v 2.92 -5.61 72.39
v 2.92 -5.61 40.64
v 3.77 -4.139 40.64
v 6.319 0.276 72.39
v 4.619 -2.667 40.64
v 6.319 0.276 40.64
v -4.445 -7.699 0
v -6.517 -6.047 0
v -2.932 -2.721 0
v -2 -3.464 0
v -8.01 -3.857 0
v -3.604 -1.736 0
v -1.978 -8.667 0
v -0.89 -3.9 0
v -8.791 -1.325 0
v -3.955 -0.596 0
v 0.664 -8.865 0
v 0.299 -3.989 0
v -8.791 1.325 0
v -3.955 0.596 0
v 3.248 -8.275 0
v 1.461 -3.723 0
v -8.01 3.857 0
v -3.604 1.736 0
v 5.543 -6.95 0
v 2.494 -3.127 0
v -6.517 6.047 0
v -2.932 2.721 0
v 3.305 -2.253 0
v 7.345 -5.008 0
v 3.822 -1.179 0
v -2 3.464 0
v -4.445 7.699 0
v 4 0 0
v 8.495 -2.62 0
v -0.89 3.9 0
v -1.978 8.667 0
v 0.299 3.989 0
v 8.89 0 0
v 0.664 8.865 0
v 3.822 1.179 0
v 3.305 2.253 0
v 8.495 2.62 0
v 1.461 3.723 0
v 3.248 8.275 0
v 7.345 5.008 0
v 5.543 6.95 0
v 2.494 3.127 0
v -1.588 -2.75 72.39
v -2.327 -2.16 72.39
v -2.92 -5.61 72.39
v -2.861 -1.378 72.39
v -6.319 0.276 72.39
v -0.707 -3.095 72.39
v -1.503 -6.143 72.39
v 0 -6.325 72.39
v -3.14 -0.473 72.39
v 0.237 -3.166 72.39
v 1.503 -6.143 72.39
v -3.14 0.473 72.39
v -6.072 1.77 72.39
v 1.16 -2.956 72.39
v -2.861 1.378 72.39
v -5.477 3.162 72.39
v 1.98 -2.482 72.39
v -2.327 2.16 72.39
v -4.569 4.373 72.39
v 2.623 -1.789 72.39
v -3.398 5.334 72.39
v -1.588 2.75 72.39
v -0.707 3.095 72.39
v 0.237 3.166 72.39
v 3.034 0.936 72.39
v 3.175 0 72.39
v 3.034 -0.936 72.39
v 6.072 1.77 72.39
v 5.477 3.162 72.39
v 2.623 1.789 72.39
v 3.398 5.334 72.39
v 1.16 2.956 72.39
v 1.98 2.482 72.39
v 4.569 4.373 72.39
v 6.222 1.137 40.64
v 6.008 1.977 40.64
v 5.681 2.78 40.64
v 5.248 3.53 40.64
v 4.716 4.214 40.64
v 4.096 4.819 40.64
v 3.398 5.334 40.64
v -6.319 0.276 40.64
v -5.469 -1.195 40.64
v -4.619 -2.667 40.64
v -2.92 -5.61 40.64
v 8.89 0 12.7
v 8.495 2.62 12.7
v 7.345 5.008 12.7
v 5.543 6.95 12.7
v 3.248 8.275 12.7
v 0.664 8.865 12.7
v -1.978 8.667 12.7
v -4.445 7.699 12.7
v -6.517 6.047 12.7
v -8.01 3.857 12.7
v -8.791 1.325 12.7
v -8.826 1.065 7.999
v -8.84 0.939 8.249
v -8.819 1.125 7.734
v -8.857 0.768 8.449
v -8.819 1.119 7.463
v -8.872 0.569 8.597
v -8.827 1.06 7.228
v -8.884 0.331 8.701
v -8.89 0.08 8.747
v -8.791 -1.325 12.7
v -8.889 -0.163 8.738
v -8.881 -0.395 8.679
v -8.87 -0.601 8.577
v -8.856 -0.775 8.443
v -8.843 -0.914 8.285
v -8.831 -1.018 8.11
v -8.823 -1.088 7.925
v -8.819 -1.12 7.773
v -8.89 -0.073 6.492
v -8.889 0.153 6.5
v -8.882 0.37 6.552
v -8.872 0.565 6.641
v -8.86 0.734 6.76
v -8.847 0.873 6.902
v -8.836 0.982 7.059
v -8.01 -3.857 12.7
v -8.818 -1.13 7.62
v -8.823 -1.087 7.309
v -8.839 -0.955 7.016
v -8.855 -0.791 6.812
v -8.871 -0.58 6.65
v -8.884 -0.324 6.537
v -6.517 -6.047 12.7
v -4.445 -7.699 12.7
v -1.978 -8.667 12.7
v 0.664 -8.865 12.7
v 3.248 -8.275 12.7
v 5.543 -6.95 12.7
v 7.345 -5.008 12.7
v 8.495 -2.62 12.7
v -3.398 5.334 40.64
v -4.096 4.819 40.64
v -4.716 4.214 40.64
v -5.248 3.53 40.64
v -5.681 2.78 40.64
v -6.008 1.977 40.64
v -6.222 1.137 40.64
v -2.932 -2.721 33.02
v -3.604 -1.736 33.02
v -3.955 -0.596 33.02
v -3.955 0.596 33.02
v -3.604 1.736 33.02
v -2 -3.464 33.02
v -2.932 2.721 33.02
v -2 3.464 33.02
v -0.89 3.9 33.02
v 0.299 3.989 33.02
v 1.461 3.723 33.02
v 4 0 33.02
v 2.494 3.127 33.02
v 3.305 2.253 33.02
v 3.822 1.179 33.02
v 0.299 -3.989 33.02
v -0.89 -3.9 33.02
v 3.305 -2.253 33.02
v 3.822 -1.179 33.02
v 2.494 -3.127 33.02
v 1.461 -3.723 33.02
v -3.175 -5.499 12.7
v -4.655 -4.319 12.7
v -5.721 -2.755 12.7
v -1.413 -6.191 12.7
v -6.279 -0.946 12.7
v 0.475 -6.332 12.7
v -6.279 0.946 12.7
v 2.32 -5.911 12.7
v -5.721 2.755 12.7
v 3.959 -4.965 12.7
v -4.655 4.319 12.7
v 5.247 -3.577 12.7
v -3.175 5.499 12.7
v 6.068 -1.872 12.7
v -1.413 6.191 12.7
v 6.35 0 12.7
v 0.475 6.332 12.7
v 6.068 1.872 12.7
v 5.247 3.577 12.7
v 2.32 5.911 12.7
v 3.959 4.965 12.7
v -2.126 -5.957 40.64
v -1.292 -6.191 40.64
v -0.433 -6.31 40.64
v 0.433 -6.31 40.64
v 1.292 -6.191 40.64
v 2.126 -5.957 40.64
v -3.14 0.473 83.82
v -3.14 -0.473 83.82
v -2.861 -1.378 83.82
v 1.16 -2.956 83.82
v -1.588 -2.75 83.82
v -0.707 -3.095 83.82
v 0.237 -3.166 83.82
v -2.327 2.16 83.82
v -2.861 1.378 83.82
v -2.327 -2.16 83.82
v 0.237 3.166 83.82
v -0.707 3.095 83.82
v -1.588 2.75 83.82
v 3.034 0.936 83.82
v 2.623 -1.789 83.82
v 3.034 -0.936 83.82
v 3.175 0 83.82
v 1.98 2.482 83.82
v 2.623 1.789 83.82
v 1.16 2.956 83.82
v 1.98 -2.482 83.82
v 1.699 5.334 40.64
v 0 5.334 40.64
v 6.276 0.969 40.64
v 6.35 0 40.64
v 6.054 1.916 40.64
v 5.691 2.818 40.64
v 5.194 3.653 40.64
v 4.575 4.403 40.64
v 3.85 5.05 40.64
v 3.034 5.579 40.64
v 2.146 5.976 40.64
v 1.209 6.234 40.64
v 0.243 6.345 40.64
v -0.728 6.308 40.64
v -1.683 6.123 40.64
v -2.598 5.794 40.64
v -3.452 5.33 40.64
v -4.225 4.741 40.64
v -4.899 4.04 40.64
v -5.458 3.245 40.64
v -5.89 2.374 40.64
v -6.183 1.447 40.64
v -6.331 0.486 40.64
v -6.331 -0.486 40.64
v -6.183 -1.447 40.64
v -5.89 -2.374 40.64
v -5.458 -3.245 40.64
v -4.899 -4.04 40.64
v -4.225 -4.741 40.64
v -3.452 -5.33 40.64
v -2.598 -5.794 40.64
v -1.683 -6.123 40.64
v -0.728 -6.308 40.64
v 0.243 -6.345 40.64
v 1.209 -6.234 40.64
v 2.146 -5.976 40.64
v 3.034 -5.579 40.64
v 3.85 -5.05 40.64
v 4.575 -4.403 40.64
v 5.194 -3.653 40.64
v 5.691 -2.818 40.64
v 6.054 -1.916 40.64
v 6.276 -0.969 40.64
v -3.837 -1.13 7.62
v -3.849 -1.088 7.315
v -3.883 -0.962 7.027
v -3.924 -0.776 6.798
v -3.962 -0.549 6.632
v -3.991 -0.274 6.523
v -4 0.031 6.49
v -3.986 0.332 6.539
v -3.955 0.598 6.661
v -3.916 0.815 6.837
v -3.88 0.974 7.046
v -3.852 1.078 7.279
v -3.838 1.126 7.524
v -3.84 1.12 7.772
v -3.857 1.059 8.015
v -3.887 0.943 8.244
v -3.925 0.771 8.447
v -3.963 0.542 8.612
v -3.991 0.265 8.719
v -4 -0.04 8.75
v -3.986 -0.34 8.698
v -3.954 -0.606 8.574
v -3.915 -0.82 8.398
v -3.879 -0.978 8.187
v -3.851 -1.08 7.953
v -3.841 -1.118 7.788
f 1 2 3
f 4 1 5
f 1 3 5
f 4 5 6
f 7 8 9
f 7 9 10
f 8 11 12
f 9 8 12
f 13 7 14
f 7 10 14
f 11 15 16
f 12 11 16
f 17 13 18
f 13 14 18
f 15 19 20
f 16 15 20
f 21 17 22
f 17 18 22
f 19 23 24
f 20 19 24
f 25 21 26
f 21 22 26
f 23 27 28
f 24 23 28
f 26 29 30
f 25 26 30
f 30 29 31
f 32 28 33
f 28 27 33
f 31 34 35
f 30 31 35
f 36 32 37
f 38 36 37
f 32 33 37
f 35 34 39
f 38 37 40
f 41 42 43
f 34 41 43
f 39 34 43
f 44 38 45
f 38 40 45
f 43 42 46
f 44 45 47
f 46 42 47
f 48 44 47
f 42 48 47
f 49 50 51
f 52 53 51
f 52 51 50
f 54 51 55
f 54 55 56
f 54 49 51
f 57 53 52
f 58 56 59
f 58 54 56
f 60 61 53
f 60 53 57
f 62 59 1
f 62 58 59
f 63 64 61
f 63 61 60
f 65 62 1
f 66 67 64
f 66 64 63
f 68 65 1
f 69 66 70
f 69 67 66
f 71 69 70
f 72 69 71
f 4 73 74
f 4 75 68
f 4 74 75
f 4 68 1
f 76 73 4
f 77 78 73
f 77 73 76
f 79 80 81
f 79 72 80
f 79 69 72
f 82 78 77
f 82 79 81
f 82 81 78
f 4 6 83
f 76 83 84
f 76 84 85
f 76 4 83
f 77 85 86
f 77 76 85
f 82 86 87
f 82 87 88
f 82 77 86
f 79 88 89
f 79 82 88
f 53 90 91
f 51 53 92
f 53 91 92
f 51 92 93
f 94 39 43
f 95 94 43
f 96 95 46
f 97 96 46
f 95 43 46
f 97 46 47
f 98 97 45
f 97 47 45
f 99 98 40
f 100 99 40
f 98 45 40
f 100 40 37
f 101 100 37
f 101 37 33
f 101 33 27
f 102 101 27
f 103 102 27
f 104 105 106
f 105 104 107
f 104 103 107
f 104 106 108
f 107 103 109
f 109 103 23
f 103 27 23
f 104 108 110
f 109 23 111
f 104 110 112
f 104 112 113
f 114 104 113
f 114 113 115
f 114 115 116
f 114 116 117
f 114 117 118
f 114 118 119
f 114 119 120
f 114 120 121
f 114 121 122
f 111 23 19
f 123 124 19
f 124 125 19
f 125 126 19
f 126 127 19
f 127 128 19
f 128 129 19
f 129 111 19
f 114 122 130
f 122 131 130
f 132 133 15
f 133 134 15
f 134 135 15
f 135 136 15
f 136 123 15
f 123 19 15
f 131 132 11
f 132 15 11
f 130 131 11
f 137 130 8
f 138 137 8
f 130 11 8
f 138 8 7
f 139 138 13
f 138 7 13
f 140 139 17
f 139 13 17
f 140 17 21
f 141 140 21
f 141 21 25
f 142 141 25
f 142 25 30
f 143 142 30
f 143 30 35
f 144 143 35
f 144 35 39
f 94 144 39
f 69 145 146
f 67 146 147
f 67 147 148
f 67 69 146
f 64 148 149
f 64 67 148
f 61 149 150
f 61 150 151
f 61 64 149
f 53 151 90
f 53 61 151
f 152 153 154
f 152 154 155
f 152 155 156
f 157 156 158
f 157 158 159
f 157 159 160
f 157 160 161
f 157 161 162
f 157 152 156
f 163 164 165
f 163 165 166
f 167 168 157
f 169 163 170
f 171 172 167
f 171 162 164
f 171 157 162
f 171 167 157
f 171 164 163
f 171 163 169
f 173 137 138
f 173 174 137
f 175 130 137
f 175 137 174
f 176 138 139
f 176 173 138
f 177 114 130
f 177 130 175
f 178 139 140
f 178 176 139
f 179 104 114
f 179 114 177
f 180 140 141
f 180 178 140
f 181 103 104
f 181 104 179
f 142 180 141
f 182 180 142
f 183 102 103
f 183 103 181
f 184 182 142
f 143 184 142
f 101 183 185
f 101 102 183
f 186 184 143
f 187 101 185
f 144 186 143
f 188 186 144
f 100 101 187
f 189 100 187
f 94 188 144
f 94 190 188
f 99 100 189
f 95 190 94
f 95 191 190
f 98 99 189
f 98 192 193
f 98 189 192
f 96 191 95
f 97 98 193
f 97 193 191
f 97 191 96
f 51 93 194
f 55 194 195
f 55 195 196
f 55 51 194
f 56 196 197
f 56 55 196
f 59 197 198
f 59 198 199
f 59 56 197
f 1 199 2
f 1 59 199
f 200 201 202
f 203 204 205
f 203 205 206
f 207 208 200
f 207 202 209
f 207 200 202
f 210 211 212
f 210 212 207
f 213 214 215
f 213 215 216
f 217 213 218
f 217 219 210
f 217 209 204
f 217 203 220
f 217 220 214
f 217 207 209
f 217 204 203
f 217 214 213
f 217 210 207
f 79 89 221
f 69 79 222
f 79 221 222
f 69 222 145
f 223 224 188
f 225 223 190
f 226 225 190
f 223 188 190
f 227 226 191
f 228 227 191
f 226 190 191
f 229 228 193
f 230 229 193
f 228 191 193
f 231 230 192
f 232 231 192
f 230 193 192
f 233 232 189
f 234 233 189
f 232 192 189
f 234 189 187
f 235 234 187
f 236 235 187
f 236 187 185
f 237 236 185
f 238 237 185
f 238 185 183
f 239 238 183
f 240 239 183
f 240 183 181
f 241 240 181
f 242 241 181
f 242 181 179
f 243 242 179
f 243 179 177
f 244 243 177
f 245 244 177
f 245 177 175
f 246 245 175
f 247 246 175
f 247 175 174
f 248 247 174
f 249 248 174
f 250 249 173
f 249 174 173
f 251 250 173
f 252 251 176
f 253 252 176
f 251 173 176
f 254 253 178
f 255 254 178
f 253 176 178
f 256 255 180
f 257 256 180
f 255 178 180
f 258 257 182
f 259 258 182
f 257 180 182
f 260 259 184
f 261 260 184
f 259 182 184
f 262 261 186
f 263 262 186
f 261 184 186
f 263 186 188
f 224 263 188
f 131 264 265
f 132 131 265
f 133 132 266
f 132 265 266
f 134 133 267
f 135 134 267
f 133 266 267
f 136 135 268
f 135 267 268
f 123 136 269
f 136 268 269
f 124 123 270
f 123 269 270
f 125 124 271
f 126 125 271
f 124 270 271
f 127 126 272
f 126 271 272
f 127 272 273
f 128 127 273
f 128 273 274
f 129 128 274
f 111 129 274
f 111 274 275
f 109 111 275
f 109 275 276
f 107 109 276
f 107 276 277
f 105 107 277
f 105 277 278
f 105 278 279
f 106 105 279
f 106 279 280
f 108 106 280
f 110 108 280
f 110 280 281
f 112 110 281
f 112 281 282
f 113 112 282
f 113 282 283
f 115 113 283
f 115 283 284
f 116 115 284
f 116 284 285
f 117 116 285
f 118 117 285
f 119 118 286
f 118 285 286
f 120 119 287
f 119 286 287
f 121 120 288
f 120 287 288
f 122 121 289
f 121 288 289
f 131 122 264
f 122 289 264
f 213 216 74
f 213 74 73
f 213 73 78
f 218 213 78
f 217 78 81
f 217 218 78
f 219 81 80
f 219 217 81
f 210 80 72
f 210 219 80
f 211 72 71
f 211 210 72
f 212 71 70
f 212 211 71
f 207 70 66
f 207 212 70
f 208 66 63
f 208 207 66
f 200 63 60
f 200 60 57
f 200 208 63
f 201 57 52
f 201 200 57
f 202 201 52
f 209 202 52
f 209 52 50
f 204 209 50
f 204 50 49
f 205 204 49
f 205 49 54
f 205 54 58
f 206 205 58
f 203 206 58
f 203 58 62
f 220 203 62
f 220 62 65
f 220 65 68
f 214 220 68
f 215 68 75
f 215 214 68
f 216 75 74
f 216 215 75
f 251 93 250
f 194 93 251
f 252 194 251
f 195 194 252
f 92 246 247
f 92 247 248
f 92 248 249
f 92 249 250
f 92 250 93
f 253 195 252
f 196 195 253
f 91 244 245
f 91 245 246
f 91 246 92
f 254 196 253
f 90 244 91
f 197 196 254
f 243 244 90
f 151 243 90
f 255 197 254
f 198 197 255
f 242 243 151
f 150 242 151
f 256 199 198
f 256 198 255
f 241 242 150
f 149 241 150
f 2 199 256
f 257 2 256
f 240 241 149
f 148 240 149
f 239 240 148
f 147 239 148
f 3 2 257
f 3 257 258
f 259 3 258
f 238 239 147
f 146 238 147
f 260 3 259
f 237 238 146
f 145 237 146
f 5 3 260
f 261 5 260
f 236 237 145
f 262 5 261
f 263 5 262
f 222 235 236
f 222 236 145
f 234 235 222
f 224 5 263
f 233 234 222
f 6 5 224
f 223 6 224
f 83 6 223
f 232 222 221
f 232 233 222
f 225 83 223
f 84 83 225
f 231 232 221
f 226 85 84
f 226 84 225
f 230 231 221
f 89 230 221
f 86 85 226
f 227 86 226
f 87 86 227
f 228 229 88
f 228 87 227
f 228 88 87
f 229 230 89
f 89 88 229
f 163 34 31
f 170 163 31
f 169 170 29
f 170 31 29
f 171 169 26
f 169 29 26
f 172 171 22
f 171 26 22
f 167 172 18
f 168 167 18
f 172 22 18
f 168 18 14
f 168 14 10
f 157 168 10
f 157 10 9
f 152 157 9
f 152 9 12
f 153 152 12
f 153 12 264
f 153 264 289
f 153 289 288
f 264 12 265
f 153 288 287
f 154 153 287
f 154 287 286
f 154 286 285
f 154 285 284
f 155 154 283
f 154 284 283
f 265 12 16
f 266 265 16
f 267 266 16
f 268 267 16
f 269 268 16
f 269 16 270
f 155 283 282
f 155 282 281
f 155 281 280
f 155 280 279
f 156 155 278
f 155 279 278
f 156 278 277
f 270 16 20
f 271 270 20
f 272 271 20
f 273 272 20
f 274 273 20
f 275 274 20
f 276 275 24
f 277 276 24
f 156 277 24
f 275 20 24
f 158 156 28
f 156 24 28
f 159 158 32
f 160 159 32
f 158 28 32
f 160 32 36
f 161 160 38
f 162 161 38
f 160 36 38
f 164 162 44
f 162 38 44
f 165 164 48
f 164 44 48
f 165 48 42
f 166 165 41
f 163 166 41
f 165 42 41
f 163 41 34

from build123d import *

# Parameters (mm, degrees)
F0_R      = 8.89
F1_DEPTH  = 12.7
F2_R      = 6.35
F3_DEPTH  = 27.94
F5_DEPTH  = 43.18
F6_R      = 20.2522571076
F6_R_2    = 6.3246
F7_DEPTH  = 43.18
F8_R      = 4
F9_DEPTH  = 33.02
F13_D     = 2.2606
F13_DEPTH = 8.89
F13_START = 0.0721476
F13_TIP   = 0.6791527577
F14_R     = 8.89
F14_R_2   = 3.175
F15_DEPTH = 11.43


with BuildPart() as f1:
    # F0 (on Top) → F1 (new body)
    with BuildSketch(Plane.XY):
        Circle(F0_R)
    extrude(amount=F1_DEPTH)

    # F2 (on face) → F3 (join)
    with BuildSketch(Plane.XY.offset(12.7)):
        Circle(F2_R)
    extrude(amount=F3_DEPTH)

    # F4 (on face) → F5 (join)
    with BuildSketch(Plane.XY.offset(40.64)):
        Polygon((0, -10.668), (9.2387590076, 5.334), (-9.2387590076, 5.334), align=None)
    extrude(amount=F5_DEPTH)

    # F6 (on face) → F7 (cut, through all)
    with BuildSketch(Plane.XY.offset(83.82)):
        Circle(F6_R)
        Circle(F6_R_2, mode=Mode.SUBTRACT)
    extrude(amount=-F7_DEPTH, mode=Mode.SUBTRACT)

    # F8 (on face) → F9 (cut)
    with BuildSketch(Plane(origin=(0, 0, 0), x_dir=(1, 0, 0), z_dir=(0, 0, -1))):
        Circle(F8_R)
    extrude(amount=-F9_DEPTH, mode=Mode.SUBTRACT)

    # F13
    # its depths count from where the whole tool has entered the part; down to there all is cleared
    with Locations(Plane(origin=(-8.89, 0, 0), x_dir=(0, 1, 0), z_dir=(-1, 0, 0)).offset(-F13_START)):
        with Locations((0, -7.62)):
            Hole(F13_D / 2, depth=F13_DEPTH)
            with Locations((0, 0, -(F13_DEPTH + F13_TIP / 2))):  # 118° drill point
                Cone(0, F13_D / 2, F13_TIP, mode=Mode.SUBTRACT)

    # F14 (on face) → F15 (cut)
    with BuildSketch(Plane.XY.offset(83.82)):
        Circle(F14_R)
        Circle(F14_R_2, mode=Mode.SUBTRACT)
    extrude(amount=-F15_DEPTH, mode=Mode.SUBTRACT)


solid = f1.part
